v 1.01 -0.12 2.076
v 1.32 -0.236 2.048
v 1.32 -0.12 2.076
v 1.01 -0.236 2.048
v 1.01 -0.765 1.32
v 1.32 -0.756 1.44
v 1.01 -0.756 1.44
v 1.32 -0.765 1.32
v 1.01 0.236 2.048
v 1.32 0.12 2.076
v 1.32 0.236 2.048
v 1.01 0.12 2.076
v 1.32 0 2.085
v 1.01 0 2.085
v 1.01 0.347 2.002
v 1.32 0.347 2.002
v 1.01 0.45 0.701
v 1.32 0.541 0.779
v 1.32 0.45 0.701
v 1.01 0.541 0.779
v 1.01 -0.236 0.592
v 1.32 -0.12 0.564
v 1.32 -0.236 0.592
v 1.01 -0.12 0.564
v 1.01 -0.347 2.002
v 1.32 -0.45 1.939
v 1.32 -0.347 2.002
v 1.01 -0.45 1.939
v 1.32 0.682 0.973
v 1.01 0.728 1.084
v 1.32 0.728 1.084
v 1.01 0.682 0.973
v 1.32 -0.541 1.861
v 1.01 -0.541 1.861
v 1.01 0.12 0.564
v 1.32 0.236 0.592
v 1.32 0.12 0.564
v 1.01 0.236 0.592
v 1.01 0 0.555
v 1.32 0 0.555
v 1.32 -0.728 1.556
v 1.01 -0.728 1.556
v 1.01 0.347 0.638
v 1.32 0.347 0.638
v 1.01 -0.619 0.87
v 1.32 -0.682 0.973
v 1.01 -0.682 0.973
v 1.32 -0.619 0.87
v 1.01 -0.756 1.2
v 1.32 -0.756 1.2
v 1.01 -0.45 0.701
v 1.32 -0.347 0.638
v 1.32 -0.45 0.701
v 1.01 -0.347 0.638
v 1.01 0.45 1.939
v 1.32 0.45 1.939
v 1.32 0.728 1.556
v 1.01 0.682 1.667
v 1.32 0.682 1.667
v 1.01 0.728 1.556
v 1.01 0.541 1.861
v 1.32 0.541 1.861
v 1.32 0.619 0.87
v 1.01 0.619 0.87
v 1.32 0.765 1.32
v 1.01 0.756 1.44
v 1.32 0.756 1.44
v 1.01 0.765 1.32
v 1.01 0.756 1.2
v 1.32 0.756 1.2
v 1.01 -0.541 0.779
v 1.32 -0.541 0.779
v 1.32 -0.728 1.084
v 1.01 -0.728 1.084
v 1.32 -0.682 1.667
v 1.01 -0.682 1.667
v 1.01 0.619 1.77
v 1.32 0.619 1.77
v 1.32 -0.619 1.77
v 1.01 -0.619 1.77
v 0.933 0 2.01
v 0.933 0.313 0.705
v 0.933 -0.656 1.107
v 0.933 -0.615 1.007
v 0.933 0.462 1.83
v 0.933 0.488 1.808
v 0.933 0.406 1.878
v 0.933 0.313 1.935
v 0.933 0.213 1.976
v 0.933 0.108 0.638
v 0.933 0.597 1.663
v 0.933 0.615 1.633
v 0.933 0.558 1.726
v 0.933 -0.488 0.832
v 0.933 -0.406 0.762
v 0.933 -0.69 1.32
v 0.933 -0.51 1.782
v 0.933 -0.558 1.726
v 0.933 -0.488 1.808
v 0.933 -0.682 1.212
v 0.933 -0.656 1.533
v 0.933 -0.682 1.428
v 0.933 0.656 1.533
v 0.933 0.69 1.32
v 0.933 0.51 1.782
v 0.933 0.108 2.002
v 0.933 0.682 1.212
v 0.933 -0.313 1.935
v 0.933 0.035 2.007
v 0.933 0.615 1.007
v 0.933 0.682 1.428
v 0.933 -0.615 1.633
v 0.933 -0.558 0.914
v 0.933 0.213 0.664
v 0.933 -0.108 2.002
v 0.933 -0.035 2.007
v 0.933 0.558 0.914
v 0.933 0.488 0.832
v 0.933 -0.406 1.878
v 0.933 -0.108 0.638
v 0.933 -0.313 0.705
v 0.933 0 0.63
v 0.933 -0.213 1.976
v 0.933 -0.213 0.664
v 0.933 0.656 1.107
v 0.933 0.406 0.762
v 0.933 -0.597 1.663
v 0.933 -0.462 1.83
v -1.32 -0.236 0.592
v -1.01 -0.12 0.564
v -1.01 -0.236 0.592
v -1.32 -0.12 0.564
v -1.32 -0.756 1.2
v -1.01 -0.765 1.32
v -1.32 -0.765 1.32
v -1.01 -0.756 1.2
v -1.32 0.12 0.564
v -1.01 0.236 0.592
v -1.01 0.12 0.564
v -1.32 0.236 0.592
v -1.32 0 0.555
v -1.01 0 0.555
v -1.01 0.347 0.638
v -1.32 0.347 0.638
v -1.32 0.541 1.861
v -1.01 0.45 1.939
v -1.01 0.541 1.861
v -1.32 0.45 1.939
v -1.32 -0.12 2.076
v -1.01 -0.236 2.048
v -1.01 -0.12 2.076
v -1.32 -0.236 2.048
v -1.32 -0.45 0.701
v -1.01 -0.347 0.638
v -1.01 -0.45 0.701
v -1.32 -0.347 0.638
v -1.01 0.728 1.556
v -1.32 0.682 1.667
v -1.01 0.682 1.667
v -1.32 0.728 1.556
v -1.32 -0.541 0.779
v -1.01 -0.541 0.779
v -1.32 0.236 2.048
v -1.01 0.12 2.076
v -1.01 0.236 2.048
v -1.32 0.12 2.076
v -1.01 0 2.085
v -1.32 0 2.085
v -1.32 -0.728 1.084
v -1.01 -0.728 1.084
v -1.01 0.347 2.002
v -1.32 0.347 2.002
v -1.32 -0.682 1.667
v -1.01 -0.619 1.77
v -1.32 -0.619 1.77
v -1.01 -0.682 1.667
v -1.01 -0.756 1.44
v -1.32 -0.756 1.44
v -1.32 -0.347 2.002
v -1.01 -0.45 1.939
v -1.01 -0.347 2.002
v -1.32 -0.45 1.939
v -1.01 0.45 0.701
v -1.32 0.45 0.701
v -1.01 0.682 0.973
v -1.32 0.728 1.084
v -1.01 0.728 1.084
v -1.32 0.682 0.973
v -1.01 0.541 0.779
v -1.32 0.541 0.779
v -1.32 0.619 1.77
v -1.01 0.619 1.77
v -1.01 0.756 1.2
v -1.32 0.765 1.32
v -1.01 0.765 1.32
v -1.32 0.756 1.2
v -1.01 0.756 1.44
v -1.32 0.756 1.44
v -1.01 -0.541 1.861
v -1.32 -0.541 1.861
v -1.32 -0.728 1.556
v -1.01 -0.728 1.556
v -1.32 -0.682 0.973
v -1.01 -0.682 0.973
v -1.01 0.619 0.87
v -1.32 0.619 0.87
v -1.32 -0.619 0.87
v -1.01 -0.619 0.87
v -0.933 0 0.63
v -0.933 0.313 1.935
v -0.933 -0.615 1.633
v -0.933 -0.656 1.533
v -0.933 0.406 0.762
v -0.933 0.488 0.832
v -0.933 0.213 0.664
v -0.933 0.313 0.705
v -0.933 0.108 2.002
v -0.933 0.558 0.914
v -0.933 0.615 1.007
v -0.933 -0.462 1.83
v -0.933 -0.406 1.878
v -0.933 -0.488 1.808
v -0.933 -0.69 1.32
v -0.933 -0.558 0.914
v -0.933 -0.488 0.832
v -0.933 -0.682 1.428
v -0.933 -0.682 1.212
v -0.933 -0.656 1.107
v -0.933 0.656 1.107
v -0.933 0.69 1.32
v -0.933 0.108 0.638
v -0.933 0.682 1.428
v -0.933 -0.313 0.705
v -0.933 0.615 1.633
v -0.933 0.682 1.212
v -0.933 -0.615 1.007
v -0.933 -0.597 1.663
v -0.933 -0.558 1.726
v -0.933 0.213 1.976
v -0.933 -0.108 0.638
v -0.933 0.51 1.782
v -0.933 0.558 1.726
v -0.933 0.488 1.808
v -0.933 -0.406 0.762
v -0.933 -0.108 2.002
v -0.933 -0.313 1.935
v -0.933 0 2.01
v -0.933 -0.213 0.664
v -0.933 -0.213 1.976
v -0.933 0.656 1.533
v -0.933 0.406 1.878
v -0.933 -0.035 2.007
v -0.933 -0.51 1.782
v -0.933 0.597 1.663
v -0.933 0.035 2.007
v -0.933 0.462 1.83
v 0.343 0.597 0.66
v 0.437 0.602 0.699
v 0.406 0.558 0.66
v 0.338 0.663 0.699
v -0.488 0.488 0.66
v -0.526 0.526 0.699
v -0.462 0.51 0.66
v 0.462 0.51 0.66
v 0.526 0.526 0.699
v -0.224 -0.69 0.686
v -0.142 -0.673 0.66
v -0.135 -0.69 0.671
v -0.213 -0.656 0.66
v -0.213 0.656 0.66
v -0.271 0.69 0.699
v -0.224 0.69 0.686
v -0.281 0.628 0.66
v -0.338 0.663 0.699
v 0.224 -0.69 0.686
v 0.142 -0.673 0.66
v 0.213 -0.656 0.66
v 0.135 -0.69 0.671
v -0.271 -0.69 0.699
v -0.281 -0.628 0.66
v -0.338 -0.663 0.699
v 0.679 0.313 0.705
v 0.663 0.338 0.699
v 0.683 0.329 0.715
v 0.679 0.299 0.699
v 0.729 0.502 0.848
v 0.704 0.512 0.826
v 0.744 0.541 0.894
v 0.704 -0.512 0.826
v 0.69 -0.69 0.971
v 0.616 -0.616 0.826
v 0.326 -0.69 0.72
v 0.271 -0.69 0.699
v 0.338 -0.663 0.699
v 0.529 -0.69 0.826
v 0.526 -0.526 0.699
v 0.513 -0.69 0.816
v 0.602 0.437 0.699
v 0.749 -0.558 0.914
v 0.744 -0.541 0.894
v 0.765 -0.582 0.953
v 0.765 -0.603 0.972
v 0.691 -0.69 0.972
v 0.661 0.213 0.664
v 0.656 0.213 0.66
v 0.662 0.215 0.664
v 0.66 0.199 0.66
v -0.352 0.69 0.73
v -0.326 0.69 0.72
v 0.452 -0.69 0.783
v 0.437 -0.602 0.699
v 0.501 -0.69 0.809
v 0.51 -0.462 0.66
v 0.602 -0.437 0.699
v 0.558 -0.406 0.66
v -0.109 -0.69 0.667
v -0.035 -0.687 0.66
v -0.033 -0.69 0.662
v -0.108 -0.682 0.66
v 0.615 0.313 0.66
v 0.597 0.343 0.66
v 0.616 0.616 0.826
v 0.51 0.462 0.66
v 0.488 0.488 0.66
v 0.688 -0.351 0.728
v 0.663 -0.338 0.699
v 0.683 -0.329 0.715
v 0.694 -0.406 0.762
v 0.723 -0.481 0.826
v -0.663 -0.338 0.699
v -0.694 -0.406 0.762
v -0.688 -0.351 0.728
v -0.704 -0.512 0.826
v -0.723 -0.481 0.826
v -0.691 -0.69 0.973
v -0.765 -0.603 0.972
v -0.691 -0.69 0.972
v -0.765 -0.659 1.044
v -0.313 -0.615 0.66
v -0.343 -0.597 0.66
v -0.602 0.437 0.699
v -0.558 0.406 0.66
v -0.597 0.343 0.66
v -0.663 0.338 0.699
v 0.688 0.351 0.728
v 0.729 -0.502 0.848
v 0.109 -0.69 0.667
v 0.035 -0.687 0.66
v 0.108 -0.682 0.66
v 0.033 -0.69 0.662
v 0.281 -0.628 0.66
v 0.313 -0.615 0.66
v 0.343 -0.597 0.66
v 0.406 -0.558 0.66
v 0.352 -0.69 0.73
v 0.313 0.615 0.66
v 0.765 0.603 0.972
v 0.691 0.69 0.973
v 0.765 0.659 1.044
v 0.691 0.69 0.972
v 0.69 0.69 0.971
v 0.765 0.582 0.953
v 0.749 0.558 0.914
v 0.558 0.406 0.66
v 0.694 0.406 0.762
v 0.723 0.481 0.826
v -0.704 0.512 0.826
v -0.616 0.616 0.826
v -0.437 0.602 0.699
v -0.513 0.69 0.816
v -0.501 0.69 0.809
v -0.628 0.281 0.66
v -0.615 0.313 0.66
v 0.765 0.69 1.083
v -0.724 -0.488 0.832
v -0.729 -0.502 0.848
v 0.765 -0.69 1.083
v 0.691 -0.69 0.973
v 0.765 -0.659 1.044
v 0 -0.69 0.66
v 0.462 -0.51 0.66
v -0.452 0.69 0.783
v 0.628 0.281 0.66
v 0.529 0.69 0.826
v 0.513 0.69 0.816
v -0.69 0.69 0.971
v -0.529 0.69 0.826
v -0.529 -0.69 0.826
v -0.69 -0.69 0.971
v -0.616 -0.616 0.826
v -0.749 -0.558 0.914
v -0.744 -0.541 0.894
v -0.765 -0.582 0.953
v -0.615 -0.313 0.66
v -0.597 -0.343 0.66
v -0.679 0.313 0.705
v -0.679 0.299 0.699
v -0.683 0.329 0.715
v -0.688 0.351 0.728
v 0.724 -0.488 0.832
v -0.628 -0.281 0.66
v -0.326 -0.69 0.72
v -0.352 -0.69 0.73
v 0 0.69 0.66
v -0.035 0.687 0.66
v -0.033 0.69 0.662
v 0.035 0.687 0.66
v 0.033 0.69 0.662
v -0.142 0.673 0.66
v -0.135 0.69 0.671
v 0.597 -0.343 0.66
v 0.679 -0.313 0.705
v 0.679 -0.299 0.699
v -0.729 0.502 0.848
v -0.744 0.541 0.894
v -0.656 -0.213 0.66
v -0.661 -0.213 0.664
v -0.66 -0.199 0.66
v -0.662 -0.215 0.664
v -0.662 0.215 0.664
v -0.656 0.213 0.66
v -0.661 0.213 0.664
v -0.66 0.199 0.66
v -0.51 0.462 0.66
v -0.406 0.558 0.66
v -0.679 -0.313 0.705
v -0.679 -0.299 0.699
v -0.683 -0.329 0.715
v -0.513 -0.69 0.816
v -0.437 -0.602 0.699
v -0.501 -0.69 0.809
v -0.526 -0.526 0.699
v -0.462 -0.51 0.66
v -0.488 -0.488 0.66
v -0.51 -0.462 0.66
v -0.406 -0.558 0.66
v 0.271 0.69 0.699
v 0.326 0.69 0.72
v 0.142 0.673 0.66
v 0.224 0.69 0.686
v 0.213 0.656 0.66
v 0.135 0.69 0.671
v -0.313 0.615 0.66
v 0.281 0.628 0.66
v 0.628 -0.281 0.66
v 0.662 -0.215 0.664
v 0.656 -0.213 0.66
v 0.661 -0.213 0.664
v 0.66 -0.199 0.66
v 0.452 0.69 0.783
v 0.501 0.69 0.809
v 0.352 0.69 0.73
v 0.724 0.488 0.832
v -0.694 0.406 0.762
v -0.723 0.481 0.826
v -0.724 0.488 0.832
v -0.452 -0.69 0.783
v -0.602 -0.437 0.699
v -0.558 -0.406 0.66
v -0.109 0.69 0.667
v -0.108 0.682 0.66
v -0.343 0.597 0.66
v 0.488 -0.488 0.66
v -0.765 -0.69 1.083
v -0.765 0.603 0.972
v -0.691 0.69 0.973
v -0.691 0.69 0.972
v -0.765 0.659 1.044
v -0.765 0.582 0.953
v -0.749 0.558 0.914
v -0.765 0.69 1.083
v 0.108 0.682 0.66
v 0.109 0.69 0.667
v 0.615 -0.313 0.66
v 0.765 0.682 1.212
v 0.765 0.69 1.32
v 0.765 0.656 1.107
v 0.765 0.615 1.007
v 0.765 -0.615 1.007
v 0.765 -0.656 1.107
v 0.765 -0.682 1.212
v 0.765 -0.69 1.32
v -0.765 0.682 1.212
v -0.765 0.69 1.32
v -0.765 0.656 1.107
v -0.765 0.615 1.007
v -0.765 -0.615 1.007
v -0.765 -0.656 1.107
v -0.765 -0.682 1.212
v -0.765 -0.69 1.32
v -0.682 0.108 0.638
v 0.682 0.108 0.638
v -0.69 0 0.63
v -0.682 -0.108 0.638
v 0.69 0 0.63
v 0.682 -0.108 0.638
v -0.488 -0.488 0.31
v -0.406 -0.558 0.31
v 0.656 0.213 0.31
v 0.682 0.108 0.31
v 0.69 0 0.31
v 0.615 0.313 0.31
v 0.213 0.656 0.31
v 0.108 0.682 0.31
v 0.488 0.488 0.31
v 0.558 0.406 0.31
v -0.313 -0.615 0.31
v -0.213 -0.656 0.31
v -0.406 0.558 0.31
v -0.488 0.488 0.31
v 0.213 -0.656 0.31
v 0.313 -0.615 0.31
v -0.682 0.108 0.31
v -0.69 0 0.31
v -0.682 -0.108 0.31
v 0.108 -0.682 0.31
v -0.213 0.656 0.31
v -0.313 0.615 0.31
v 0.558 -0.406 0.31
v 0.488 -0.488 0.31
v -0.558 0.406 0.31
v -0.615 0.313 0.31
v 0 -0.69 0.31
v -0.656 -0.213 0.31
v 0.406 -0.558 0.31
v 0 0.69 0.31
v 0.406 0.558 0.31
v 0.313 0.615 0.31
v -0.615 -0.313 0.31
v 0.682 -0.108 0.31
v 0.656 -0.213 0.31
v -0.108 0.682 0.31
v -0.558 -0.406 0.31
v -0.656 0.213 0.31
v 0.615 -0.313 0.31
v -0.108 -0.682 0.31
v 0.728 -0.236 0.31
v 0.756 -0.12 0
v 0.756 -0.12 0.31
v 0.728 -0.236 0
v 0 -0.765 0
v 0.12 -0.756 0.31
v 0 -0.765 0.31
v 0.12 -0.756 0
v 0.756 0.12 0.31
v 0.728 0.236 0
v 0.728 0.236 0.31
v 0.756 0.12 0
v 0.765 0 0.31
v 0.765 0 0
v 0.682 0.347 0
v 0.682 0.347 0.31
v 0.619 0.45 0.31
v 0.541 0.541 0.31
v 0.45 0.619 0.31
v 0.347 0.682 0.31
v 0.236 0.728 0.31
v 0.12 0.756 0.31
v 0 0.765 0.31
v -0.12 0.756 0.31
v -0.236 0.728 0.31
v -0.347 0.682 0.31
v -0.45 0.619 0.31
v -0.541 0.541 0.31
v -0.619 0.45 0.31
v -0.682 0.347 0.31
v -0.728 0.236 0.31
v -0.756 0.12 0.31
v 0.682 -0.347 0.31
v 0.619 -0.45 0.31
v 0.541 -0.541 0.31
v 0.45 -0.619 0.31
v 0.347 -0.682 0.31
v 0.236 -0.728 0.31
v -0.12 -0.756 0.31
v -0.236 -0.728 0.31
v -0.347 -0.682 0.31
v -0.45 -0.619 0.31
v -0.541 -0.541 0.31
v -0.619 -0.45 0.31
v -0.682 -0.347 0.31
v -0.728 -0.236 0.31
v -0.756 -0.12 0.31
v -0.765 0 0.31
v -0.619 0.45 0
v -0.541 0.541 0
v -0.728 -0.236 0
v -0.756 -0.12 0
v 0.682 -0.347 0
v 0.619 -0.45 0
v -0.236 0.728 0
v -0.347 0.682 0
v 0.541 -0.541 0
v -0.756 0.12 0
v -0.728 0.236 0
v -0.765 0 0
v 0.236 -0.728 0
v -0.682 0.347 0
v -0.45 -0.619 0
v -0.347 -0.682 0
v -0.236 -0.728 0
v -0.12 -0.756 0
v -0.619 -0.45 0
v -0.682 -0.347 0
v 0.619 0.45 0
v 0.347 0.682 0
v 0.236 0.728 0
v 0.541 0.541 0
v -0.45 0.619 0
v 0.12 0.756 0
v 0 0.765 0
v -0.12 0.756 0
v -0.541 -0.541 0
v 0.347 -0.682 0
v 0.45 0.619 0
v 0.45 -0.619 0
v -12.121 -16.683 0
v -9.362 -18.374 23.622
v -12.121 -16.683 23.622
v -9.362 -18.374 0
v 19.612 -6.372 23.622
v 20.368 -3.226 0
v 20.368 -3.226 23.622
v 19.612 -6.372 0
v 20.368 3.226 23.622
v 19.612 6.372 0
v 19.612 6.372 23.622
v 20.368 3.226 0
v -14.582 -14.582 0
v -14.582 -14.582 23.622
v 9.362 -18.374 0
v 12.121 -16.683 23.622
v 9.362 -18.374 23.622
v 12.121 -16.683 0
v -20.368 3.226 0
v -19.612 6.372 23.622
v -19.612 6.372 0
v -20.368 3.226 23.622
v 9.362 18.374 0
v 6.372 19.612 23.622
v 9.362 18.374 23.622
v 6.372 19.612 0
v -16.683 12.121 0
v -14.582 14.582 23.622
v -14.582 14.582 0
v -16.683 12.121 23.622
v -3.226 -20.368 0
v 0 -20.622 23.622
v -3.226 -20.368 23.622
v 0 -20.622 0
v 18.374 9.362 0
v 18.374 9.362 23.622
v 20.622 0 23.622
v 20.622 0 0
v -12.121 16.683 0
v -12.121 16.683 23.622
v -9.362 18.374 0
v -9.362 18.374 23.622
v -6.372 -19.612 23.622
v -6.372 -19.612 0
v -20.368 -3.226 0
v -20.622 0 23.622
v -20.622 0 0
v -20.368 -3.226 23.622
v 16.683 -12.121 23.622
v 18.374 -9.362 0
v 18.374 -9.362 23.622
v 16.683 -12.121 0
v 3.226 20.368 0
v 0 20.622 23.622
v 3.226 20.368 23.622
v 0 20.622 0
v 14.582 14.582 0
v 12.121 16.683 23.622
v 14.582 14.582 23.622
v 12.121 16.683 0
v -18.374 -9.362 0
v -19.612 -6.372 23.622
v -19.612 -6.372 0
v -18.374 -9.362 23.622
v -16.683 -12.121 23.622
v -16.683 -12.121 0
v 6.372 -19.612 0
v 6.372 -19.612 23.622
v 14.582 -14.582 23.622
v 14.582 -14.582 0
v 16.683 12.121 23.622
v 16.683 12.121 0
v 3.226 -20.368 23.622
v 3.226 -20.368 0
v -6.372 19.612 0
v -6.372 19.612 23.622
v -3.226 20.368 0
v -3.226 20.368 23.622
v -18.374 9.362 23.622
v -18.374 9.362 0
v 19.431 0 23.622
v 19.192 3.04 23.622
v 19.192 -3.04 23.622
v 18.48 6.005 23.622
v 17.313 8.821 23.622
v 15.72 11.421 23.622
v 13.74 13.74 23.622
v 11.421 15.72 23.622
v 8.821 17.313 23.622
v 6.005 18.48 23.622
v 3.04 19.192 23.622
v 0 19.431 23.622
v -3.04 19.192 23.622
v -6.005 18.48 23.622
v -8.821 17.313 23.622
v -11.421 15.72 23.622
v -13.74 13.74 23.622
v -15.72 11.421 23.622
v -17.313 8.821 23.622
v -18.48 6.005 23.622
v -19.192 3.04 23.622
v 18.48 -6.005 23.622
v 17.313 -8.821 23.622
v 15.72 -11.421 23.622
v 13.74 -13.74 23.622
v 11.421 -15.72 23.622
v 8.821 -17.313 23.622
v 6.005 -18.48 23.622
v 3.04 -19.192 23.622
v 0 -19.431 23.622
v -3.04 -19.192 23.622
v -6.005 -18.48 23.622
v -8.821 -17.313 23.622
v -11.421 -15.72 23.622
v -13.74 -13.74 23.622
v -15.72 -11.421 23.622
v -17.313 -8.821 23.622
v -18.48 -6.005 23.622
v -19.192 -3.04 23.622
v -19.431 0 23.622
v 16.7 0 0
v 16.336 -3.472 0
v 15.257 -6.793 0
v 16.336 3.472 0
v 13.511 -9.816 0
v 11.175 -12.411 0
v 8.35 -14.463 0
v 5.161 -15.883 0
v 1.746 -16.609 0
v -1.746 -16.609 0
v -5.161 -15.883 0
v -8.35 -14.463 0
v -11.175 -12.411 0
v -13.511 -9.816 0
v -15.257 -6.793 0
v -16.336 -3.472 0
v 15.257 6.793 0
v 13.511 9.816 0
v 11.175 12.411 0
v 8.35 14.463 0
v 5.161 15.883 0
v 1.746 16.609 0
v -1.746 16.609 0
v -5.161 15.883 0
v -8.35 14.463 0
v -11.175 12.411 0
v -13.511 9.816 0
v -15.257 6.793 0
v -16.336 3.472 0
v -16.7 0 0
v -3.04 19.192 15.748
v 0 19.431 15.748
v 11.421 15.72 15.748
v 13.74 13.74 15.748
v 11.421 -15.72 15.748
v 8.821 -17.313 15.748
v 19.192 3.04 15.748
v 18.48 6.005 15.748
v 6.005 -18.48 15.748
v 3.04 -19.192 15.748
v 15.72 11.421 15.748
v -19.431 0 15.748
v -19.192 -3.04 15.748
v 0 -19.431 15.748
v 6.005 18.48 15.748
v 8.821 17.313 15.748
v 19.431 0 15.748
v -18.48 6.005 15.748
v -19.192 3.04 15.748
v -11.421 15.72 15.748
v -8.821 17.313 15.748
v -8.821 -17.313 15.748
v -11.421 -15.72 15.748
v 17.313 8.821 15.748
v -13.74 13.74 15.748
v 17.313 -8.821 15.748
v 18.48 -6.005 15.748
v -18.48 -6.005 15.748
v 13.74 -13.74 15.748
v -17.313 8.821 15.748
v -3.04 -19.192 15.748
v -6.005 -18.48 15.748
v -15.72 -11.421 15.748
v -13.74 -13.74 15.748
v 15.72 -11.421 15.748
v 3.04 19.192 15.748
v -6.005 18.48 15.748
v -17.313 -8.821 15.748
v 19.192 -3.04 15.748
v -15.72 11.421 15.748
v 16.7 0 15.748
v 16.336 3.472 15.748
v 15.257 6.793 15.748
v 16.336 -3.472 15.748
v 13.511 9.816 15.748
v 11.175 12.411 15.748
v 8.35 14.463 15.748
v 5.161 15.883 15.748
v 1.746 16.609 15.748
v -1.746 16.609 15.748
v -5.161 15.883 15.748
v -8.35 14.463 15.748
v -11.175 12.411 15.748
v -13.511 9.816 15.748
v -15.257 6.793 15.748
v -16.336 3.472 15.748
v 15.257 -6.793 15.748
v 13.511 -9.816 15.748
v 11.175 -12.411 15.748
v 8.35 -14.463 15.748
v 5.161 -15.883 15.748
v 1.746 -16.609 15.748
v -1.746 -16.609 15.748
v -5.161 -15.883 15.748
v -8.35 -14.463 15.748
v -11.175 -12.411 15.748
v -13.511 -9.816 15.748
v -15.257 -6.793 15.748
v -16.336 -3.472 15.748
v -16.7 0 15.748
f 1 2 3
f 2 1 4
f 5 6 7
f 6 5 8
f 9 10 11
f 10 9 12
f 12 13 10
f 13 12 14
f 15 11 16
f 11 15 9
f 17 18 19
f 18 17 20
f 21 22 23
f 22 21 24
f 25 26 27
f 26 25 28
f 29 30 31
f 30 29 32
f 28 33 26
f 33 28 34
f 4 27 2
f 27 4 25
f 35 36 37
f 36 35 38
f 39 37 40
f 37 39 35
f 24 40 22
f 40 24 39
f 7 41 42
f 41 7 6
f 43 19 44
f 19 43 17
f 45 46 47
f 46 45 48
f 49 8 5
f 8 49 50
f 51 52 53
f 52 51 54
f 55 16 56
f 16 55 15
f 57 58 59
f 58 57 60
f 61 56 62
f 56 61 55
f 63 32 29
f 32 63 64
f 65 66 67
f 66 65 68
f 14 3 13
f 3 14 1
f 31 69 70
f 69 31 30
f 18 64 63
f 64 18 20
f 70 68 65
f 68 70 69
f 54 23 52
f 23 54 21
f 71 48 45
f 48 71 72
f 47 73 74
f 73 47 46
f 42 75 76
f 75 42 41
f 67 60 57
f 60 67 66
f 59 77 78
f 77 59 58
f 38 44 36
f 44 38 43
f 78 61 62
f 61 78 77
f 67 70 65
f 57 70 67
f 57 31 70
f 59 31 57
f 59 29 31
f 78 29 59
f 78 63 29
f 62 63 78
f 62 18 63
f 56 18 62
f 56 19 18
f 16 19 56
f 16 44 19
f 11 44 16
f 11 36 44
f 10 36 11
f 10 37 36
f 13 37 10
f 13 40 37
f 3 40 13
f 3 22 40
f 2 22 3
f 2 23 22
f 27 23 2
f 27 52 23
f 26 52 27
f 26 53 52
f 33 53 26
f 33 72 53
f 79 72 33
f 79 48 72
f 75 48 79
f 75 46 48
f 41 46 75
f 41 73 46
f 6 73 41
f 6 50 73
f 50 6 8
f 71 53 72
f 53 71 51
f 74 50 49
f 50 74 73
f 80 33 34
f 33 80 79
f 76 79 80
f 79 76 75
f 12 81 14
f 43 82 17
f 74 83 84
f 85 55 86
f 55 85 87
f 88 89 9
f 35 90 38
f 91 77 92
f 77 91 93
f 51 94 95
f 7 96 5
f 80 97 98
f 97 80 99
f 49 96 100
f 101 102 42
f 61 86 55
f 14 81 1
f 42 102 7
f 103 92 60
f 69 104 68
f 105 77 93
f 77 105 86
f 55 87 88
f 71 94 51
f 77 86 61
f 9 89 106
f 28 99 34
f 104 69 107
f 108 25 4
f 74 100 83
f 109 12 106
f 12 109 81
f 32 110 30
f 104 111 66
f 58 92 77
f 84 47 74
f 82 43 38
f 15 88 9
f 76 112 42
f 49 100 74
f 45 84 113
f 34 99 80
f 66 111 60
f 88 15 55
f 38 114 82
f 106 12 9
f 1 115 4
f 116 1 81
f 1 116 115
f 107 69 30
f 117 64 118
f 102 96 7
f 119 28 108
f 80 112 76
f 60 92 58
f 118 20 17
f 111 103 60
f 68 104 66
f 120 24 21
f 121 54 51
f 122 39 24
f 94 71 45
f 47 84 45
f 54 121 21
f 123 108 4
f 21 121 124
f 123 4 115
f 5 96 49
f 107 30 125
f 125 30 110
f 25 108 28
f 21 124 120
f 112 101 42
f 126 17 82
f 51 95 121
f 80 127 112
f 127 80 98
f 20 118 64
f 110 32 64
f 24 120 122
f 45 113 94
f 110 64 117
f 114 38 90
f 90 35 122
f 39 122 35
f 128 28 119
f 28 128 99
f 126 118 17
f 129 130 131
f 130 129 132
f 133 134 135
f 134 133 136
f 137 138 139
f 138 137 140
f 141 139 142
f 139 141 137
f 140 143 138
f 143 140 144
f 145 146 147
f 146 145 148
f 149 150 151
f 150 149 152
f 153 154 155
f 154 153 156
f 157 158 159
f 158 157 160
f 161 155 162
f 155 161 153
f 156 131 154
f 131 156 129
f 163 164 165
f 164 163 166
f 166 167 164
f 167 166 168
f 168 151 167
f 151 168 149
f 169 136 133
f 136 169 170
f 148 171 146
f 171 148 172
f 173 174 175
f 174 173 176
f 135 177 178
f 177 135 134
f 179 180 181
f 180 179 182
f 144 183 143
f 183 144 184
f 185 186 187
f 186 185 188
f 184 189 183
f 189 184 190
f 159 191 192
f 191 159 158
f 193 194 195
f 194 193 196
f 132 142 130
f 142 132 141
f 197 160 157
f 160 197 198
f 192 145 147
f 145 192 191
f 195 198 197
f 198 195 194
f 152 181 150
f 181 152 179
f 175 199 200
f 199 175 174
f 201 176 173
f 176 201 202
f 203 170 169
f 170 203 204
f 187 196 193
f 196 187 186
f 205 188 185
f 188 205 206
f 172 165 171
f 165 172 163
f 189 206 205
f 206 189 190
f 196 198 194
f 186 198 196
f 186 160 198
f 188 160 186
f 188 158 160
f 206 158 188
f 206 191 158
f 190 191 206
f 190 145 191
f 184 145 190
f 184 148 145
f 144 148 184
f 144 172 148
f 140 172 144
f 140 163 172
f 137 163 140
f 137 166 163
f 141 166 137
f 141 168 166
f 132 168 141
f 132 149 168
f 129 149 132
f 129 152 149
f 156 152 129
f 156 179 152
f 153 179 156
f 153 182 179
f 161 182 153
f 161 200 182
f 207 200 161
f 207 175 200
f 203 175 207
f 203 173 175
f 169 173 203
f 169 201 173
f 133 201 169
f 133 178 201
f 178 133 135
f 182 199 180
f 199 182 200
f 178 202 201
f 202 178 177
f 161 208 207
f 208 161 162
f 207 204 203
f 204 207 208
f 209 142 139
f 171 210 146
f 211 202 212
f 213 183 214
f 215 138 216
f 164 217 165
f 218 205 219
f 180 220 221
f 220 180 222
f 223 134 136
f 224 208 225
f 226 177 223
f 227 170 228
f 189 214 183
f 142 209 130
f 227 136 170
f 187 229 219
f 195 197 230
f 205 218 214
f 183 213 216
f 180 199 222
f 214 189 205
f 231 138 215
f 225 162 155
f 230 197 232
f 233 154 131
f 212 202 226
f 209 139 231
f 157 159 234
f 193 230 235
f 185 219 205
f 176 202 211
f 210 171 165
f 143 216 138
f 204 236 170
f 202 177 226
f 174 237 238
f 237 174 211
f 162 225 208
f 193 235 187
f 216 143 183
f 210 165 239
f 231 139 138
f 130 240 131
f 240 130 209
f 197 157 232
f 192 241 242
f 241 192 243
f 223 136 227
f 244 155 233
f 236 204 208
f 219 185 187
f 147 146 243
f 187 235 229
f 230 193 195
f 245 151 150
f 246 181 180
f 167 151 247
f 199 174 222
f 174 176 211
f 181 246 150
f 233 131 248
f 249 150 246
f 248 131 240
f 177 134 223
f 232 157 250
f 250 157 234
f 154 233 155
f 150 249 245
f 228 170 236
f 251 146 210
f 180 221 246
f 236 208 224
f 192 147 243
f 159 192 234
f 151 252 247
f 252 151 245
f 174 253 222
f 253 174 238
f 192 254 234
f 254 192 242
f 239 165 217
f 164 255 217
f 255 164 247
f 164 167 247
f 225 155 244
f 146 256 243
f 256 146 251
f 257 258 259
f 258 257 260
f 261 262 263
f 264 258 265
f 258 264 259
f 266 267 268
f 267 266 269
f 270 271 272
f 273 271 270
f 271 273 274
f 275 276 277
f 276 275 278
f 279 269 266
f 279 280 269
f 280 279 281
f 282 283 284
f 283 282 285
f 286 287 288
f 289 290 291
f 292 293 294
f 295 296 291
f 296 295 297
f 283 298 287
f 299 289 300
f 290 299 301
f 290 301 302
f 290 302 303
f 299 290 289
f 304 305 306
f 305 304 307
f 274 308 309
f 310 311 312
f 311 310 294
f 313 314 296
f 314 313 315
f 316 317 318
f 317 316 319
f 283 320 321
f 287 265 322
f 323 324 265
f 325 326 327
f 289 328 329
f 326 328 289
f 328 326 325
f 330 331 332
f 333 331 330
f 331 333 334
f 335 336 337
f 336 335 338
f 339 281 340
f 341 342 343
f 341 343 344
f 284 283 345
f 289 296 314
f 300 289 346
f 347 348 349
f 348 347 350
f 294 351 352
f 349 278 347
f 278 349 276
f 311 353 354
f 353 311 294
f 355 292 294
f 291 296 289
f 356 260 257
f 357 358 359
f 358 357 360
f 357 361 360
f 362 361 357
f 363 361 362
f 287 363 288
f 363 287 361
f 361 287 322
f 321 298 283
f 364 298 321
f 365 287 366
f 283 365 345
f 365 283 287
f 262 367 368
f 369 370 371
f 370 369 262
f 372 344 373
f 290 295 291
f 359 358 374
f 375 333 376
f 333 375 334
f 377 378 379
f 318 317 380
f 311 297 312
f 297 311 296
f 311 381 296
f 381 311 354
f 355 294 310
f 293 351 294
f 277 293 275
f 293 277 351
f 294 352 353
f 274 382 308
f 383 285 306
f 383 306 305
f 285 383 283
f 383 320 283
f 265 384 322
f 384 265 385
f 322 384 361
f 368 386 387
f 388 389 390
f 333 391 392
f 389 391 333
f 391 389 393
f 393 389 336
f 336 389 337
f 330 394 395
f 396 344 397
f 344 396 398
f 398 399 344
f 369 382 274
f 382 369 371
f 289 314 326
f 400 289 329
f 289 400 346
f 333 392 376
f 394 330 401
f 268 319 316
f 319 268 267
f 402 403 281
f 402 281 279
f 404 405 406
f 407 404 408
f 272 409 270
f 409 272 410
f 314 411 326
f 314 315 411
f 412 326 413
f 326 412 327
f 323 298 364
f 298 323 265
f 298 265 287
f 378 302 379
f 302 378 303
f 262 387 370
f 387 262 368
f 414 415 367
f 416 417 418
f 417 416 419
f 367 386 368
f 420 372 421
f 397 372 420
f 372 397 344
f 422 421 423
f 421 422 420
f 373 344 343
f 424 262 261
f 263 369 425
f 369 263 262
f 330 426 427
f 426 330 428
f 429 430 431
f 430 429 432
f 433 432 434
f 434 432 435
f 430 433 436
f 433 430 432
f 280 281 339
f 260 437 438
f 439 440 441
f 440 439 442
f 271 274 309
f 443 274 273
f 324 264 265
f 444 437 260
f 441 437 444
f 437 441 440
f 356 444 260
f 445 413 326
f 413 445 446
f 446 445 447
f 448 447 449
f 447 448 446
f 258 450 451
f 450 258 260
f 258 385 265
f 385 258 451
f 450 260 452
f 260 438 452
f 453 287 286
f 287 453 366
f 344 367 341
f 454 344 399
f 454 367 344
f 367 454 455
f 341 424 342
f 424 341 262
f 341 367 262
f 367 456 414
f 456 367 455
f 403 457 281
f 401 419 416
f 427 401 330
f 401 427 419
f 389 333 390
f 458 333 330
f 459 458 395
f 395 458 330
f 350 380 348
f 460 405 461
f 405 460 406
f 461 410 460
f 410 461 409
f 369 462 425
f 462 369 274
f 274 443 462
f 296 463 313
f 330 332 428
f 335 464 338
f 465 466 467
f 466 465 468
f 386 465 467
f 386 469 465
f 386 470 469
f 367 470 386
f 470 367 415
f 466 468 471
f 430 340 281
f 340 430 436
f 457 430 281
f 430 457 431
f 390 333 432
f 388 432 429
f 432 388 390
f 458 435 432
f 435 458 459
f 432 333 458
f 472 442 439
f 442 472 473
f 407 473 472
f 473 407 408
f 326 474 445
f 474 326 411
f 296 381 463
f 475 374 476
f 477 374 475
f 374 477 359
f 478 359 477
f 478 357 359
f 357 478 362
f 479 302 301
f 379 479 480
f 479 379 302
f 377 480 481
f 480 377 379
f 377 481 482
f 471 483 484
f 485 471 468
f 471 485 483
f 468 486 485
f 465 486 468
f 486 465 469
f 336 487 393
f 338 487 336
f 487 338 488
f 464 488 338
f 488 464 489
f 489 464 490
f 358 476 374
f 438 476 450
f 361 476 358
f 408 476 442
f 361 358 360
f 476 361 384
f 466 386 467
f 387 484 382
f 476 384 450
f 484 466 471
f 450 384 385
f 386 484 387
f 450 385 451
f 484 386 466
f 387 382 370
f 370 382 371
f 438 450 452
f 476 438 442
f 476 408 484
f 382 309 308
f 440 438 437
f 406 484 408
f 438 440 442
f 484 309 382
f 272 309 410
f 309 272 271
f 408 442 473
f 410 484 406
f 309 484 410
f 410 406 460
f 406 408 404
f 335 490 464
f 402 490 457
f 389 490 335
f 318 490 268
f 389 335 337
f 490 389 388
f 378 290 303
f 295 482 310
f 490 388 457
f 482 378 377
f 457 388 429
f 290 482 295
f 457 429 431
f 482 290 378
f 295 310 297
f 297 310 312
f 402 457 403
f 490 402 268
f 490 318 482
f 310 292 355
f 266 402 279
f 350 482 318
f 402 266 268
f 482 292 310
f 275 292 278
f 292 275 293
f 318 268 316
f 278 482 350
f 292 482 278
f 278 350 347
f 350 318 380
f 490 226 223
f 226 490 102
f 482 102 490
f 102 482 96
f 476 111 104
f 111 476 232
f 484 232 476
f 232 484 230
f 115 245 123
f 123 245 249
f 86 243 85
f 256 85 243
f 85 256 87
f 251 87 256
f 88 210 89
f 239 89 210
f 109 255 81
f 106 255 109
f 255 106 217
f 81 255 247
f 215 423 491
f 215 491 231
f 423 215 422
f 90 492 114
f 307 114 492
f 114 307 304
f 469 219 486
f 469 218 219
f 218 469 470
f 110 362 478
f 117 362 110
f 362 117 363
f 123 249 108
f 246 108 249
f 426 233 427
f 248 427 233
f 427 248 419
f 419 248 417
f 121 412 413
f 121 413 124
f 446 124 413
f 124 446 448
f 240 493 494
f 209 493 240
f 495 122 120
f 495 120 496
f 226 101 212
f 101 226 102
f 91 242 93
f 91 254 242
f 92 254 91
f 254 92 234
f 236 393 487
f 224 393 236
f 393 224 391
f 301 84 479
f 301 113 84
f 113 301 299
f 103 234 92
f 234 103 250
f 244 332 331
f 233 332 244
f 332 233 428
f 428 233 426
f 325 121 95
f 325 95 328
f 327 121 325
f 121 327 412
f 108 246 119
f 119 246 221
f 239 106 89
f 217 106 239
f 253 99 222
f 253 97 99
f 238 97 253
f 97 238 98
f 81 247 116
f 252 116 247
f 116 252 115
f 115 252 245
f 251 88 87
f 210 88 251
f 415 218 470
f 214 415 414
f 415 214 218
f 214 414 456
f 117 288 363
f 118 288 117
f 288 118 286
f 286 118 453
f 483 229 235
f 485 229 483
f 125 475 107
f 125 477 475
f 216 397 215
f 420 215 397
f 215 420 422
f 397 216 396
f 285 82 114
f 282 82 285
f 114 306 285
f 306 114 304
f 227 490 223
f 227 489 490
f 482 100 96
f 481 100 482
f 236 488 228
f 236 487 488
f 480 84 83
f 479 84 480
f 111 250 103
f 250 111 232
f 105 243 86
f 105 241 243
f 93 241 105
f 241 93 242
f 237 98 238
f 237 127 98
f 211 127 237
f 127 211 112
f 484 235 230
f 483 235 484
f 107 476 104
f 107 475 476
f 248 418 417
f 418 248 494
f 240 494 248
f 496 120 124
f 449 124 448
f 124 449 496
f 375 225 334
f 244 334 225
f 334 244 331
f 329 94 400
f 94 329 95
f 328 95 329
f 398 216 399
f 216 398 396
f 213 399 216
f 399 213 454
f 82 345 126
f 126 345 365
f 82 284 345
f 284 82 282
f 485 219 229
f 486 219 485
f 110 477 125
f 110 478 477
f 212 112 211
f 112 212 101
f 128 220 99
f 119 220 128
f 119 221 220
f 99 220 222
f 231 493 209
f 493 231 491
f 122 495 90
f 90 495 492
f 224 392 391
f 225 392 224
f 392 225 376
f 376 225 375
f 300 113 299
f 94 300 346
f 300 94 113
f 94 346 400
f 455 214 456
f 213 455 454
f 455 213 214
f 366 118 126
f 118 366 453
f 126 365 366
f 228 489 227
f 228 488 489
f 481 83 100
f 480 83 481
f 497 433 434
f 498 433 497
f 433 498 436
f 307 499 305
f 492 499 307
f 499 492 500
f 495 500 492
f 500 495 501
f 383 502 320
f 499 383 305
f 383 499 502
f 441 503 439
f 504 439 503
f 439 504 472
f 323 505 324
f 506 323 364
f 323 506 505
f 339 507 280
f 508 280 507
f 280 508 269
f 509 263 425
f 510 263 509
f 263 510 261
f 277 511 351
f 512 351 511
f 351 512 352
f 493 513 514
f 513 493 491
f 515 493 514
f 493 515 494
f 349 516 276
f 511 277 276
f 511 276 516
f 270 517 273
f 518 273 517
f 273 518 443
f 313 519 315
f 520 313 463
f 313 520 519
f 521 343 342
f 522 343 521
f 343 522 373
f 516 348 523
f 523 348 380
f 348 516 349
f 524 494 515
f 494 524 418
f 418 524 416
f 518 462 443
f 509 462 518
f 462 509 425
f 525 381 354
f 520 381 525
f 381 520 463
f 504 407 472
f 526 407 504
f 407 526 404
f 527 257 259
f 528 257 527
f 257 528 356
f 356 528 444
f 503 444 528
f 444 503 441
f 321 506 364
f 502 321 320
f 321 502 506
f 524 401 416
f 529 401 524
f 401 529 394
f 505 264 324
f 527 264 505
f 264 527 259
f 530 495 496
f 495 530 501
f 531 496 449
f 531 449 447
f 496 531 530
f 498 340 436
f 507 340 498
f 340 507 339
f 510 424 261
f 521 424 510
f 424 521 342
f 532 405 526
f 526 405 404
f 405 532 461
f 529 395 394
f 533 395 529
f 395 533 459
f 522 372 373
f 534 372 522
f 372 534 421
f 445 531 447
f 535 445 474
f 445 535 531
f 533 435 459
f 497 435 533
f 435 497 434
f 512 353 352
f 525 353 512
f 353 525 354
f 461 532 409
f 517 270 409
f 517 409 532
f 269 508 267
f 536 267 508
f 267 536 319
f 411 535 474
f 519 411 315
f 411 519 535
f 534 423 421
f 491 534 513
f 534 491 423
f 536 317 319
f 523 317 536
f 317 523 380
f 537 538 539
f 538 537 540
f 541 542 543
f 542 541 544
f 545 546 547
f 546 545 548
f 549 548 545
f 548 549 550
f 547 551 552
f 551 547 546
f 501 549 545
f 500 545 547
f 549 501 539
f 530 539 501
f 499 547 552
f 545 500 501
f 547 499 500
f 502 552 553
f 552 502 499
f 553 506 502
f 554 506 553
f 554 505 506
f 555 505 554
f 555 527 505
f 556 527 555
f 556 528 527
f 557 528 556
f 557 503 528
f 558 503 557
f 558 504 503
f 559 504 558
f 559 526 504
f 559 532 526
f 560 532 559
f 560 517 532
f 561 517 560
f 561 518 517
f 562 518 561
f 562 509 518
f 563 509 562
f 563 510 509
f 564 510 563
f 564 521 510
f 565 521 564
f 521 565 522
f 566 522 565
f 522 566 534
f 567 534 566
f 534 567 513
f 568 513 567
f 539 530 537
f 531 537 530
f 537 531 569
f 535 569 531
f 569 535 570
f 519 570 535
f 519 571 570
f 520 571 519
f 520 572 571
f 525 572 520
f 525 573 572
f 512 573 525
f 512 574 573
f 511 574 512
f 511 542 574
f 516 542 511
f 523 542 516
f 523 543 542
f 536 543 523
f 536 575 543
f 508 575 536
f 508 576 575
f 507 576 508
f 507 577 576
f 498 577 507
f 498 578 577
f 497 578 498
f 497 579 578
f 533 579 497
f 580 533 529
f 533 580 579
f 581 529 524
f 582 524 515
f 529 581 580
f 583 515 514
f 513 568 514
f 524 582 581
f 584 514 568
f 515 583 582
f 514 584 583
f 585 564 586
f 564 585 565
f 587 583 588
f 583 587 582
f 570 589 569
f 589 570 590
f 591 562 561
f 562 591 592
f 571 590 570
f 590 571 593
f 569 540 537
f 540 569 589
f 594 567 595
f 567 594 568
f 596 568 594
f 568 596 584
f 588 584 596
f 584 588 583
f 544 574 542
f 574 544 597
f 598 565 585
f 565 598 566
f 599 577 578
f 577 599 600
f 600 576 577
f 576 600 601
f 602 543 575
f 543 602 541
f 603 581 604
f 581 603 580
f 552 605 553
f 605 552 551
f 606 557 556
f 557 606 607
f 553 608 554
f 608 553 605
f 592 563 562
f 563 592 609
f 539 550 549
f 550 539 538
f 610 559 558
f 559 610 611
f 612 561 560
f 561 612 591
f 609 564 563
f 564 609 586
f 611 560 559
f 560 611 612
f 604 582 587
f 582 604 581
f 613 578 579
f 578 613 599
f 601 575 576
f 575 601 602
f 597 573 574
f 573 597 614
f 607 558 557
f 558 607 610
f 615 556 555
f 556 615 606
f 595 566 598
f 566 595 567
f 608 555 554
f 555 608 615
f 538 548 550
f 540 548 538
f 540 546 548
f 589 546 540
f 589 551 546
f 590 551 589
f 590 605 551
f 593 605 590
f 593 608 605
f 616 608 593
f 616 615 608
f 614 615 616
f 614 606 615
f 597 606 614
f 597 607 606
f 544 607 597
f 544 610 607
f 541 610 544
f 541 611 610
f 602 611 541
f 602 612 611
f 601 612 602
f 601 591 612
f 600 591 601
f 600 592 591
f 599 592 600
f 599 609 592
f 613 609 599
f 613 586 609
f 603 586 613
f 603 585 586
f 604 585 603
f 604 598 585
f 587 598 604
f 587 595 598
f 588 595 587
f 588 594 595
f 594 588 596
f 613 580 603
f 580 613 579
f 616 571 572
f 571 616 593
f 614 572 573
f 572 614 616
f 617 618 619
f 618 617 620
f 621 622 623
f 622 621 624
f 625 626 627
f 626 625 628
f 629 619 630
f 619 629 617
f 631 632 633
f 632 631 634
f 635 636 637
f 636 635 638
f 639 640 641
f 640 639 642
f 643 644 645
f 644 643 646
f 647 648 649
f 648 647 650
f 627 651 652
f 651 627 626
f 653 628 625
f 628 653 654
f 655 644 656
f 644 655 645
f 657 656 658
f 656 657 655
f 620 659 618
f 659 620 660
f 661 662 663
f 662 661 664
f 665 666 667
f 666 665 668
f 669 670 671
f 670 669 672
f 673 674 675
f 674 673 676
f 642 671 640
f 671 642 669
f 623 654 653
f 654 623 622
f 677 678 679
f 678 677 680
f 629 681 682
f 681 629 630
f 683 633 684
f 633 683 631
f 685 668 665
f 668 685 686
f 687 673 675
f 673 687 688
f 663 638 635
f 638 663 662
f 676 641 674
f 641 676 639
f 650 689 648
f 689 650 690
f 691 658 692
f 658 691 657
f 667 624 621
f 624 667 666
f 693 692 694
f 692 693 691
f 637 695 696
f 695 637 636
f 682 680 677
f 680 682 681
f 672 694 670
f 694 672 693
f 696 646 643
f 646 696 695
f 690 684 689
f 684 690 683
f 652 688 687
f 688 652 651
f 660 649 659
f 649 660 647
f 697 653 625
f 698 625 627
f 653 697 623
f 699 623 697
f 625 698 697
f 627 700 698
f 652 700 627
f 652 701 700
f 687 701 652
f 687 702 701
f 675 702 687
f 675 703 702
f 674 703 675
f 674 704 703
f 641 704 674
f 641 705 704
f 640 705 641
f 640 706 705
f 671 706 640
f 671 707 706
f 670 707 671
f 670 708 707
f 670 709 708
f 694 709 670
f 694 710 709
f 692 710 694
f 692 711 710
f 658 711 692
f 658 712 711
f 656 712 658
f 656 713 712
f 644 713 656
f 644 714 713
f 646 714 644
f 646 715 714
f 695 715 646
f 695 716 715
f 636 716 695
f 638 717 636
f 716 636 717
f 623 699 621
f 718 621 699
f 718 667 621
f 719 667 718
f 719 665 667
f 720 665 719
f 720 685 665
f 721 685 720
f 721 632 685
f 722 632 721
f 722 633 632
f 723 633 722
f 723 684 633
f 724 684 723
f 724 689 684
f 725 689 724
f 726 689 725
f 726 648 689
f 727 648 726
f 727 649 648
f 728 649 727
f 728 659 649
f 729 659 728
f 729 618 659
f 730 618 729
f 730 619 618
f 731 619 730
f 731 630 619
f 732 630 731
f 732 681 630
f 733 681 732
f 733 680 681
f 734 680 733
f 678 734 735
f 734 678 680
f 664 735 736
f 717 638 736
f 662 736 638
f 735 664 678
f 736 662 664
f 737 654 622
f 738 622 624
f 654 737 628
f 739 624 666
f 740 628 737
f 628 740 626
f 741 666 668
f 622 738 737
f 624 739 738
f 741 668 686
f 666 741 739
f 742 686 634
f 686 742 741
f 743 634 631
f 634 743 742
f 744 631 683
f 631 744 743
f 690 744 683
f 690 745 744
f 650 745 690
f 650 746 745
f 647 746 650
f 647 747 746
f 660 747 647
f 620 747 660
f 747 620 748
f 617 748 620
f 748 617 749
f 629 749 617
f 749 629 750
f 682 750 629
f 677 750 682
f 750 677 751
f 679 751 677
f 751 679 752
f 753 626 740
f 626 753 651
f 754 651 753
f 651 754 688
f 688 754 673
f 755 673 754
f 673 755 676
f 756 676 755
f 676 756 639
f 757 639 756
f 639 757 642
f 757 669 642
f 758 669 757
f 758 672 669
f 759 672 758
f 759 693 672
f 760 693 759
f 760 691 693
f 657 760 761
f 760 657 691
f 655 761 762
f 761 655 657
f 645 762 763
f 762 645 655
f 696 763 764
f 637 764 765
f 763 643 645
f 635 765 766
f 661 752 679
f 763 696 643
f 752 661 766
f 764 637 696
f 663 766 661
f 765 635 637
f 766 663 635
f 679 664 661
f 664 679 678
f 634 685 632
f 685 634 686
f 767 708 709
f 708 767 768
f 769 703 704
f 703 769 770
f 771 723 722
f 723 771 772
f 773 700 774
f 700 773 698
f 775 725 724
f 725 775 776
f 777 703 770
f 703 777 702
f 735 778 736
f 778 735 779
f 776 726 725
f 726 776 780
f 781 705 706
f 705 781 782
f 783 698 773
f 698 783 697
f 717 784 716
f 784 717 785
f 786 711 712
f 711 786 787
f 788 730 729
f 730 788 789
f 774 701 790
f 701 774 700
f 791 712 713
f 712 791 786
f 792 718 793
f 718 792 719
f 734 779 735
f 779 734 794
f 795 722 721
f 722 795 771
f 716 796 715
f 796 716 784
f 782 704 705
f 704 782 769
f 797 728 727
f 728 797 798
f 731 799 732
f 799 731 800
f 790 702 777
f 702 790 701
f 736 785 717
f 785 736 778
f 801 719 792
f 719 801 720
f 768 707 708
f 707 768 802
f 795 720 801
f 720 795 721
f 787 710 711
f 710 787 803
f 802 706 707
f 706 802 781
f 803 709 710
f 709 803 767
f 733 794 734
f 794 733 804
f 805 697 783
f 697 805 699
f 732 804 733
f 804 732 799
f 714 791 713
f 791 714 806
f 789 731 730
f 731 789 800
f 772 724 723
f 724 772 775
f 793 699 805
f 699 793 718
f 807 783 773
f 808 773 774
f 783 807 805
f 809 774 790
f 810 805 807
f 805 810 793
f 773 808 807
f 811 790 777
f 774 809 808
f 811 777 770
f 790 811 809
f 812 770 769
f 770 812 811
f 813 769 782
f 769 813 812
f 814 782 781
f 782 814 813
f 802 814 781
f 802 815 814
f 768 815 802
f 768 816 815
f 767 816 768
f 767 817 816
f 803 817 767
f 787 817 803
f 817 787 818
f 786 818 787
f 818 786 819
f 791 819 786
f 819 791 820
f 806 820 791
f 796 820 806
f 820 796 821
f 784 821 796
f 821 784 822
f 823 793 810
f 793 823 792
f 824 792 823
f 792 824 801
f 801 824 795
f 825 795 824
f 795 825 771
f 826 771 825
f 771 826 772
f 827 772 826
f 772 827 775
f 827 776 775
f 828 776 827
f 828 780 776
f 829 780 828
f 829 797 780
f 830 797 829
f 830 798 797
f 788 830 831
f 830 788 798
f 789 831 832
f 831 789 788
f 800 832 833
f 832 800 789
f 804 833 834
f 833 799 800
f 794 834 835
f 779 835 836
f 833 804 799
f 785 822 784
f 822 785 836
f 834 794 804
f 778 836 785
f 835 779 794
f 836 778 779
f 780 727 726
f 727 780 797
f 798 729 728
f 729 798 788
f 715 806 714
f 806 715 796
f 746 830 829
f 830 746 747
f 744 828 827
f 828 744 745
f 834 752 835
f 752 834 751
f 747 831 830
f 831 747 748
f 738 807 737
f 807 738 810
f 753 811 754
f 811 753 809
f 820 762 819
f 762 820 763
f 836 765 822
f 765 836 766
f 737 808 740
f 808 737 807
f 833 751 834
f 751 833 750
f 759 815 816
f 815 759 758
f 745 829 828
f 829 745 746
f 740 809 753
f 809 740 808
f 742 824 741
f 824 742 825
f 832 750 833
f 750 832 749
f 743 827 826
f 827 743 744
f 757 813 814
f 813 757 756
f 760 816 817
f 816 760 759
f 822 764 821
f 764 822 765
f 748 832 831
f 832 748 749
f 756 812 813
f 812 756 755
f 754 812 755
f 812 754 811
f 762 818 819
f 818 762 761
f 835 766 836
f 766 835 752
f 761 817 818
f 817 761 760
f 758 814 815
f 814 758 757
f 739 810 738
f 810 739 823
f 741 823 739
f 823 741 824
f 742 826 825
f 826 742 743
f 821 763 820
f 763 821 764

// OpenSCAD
// file: ../Vitamins/Rod.scad
RodDiameter       = 1;
RodRadius         = 2;
RodClearanceSnug  = 3;
RodClearanceLoose = 4;
RodFn             = 5;

RodOneEighthInch = [
  [RodDiameter, 1/8],
  [RodRadius, 1/8/2],
  [RodClearanceSnug, 0.02],
  [RodClearanceLoose, 0.03],
  [RodFn, 16]
];

RodOneQuarterInch = [
  [RodDiameter,       1/4],
  [RodRadius,         1/4/2],
  [RodClearanceSnug,  0.027],
  [RodClearanceLoose, 0.035],
  [RodFn,             20]
];

RodThreeQuarterInchTubing = [
  [RodDiameter,       0.758],
  [RodRadius,         0.758/2],
  [RodClearanceSnug,  0.023],
  [RodClearanceLoose, 0.029],
  [RodFn,             40]
];

/**
 * Lookup the diameter of a rod.
 * @param rod The rod to lookup.
 * @param clearance The RodClearance to use.
 */
function RodDiameter(rod=undef, clearance=undef)
           = lookup(RodDiameter, rod)
          + (clearance != undef ? lookup(clearance, rod) : 0);

/**
 * Lookup the radius of a rod.
 * @param rod The rod to lookup.
 * @param clearance The RodClearance to use.
 */
function RodRadius(rod, clearance=undef) = RodDiameter(rod, clearance)/2;

/**
 * Lookup the $fn value for a rod, optionally overriding it
 * @param rod The rod to lookup.
 * @param $fn Override the RodFn. If defined, this will be the result. (convenience arg)
 **/
function RodFn(rod, $fn=undef) = ($fn == undef) ? lookup(RodFn, rod) : $fn;

/**
 * A 2D rod (circle).
 * @param rod The rod to render.
 * @param clearance The RodClearance to use.
 * @param $fn Override the RodFn value of the rod.
 */
module Rod2d(rod=RodOneQuarterInch, clearance=undef, $fn=undef) {
  circle(r=RodRadius(rod, clearance),
         $fn=RodFn(rod, $fn));
}


module Rod(rod=RodOneQuarterInch, length=1, clearance=undef, center=false, $fn=undef) {
  render(convexity=1)
  linear_extrude(height=length, center=center)
  Rod2d(rod, clearance, $fn=$fn);
}

// 1/8" Rod
1_8_rod_d                = 1/8;
1_8_rod_r                = 1_8_rod_d/2;
1_8_rod_clearance        = 0.02;
1_8_rod_clearance_loose  = 0.03;

// 1/4" Rod
1_4_rod_d                = 1/4;
1_4_rod_r                = 1_4_rod_d/2;
1_4_rod_clearance        = 0.01;
1_4_rod_clearance_loose  = 0.015;
1_4_rod_collar_d         = 1/22;
1_4_rod_collar_width     = 0.27;
1_4_rod_collar_clearance = 0.0; // TODO

// 5/16" Rod
5_16_rod_d                = 5/16;
5_16_rod_r                = 5_16_rod_d/2;
5_16_rod_clearance        = 0.02; // TODO
5_16_rod_clearance_loose  = 0.02;

module rod(diameter=1, length=1, clearance=0, clearance_loose=0, loose=false, cutter=false, center=false, $fn=20) {
  clearance = loose ? clearance_loose : clearance;

  if (cutter) {
    cylinder(r=(diameter/2) + (loose ? clearance_loose : clearance), h=length, center=center);
  } else {
    cylinder(r=diameter/2, h=length, center=center);
  }
}

module 1_8_rod(length=1, loose=false, cutter=false, center=false) {
  rod(diameter=1_8_rod_d,
      clearance=1_8_rod_clearance,
      clearance_loose=1_8_rod_clearance_loose,
      length=length,
      cutter=cutter,
      center=center);
}

module 1_4_rod(length=1, loose=false, cutter=false, center=false) {
  rod(diameter=1_4_rod_d,
      clearance=1_4_rod_clearance,
      clearance_loose=1_4_rod_clearance_loose,
      loose=loose,
      length=length,
      cutter=cutter,
      center=center);
}

module 1_4_rod_collar(cutter=false) {
  rod(diameter=1_4_rod_collar_d,
      clearance=1_4_rod_collar_clearance,
      cutter=cutter,
      length=1_4_rod_collar_width);
}

module 5_16_rod(length=1, loose=false, cutter=false, center=false) {
  rod(diameter=5_16_rod_d,
      clearance=5_16_rod_clearance,
      clearance_loose=5_16_rod_clearance_loose,
      length=length,
      cutter=cutter,
      center=center);
}
// file: ../Vitamins/Pipe.scad
//
// Pipe dimensions
//
PipeInnerDiameter   = 1; // Inner Diameter of pipe, smallest measurement if asymmetrical
PipeOuterDiameter   = 2; // Outer Diameter of pipe, largest measurement if asymmetrical
PipeTaperedDiameter = 3; // Threads are tapered, smallest measurement if asymmetrical
PipeThreadLength    = 4; // Total length of the pipe thread
PipeThreadDepth     = 5; // Depth when fully seated
PipeClearanceSnug   = 6; // Added to the diameter, should not slip
PipeClearanceLoose  = 7; // Added to the diameter, should slide freely
PipeFn              = 8; // Number of sides
PipeWeightPerUnit   = 9;

function PipeClearance(pipe, clearance)     = (clearance != undef) ? lookup(clearance, pipe) : 0;
function PipeOuterDiameter(pipe, clearance) = lookup(PipeOuterDiameter, pipe) + PipeClearance(clearance);
function PipeInnerDiameter(pipe, clearance) = lookup(PipeInnerDiameter, pipe) + PipeClearance(clearance);
function PipeOuterRadius(pipe, clearance)   = PipeOuterDiameter(pipe, clearance)/2;
function PipeInnerRadius(pipe, clearance)   = PipeInnerDiameter(pipe, clearance)/2;
function PipeWall(pipe)                     = PipeOuterRadius(pipe) - PipeInnerRadius(pipe);

module Pipe(pipe, length = 1, clearance=undef) {
  cylinder(r=PipeOuterRadius(pipe, clearance=clearance), h=length, $fn=lookup(PipeFn, pipe));
};

//Pipe(PipeOneInch, clearance=PipeClearanceLoose);


// 1/4" Pipe
PipeOneQuarterInch = [
  [PipeInnerDiameter,   0.265],
  [PipeOuterDiameter,   0.415],
  [PipeTaperedDiameter, 0.415], // TODO: Verify
  [PipeThreadLength,    0.5],   // TODO: Verify
  [PipeThreadDepth,     0.25],  // TODO: Verify
  [PipeClearanceSnug,   0.015], // TODO: Verify
  [PipeClearanceLoose,  0.027], // TODO: Verify
  [PipeFn,              20],
  [PipeWeightPerUnit,   0] // TODO
];


// 3/4" Pipe
PipeThreeQuartersInch = [
  [PipeInnerDiameter,   0.81],
  [PipeOuterDiameter,   1.07],
  [PipeTaperedDiameter, 1.018],
  [PipeThreadLength,    0.9],
  [PipeThreadDepth,     0.5],
  [PipeClearanceSnug,   0.005],
  [PipeClearanceLoose,  0.027],
  [PipeFn,              30],
  [PipeWeightPerUnit,   0] // TODO
];

// 1" Pipe
PipeOneInch = [
  [PipeInnerDiameter,   1.06],
  [PipeOuterDiameter,   1.315],
  [PipeTaperedDiameter, 1.285],
  [PipeThreadLength,    0.982],
  [PipeThreadDepth,     0.5], // TODO: Verify
  [PipeClearanceSnug,   0.02],
  [PipeClearanceLoose,  0.03],
  [PipeFn,              30],
  [PipeWeightPerUnit,   0] // TODO
];


// Fittings: Tee
TeeOuterDiameter = 1; // Diameter of the body, not the rim
TeeWidth         = 2; // Across the top of the tee, side-to-side
TeeHeight        = 3; // From the middle of the bottom rim to the top of the body
TeeInnerDiameter = 4; // Diameter of the threaded hole
TeeRimDiameter   = 5; // Diameter of the tee rim
TeeRimWidth      = 6; // Width of the tee rim
TeeInfillSphere  = 7; // Diameter of the infill sphere, cuts out the casting infill between the tee sections
TeeInfillOffset  = 8; // Offset for the infill sphere from center

TeeThreeQuarterInch = [
  [TeeOuterDiameter, 1.38],
  [TeeWidth,         2.64],
  [TeeHeight,        2.01],
  [TeeInnerDiameter, 0.88],
  [TeeRimDiameter,   1.53],
  [TeeRimWidth,      0.31],
  [TeeInfillSphere,  0.25],
  [TeeInfillOffset,  0.38]
];

function TeeOuterDiameter(tee) = lookup(TeeOuterDiameter, tee);
function TeeOuterRadius(tee)   = lookup(TeeOuterDiameter, tee)/2;
function TeeWidth(tee)         = lookup(TeeWidth, tee);
function TeeHeight(tee)        = lookup(TeeHeight, tee);
function TeeInnerDiameter(tee) = lookup(TeeInnerDiameter, tee);
function TeeInnerRadius(tee)   = lookup(TeeInnerDiameter, tee)/2;
function TeeRimDiameter(tee)   = lookup(TeeRimDiameter, tee);
function TeeRimRadius(tee)     = lookup(TeeRimDiameter, tee)/2;
function TeeRimWidth(tee)      = lookup(TeeRimWidth, tee);
function TeeCenter(tee)        = lookup(TeeHeight, tee) - TeeOuterRadius(tee);

module Tee(tee, $fn=40) {
   union() {

     // Top Body
     rotate([0,-90,0])
     translate([TeeHeight(tee) - (TeeOuterDiameter(tee)/2),0,0])
     cylinder(r=TeeOuterRadius(tee), h=TeeWidth(tee) * 0.99, center=true);

     // Bottom Body
     translate([0,0,TeeCenter(tee) * 0.01])
     cylinder(r=TeeOuterRadius(tee), h=TeeCenter(tee) * 0.98);

     // Bottom Rim
     cylinder(r=TeeRimRadius(tee), h=TeeRimWidth(tee));
     
    
    // Rims
    for (i = [1, -1]) {
      
      // Rim
      translate([i*TeeWidth(tee)/2,0,TeeCenter(tee)])
      rotate([0,i*-90,0]) {
      cylinder(r=TeeRimRadius(tee), h=TeeRimWidth(tee));
      
      // Casting Infill
      translate([0,0,TeeRimWidth(tee)])
      cylinder(r1=TeeRimRadius(tee),
               r2=TeeOuterRadius(tee),
                h=TeeRimWidth(tee)*1/4);
      }
    }
    
    // Tee Body Casting Infill
    // TODO: Tweak this? Could be better, could be worse.
    intersection() {
      translate([0,0,TeeCenter(tee) + lookup(TeeInfillSphere, tee)])
      sphere(r=TeeRimRadius(tee) + lookup(TeeInfillOffset, tee));

      translate([-TeeRimRadius(tee),-TeeOuterRadius(tee),0])
      cube([TeeRimDiameter(tee),TeeOuterDiameter(tee),TeeCenter(tee)]);
    }
   }
};

Tee(TeeThreeQuarterInch);

module TeeRim(tee=TeeThreeQuarterInch, heightMultiplier=1) {
  cylinder(r=TeeRimRadius(tee), h=TeeRimWidth(tee) * heightMultiplier);
}

// Fittings: Bushings
BushingHeight    = 1;
BushingDiameter  = 2;
BushingDepth     = 3; // Bushing screws in about half an inch
BushingCapWidth  = 4;
BushingCapHeight = 5;


// 3/4" Bushing
BushingThreeQuarterInch = [
  [BushingHeight,    0.955],
  [BushingDiameter,  1],
  [BushingDepth,     0.5],
  [BushingCapWidth,  1.225],
  [BushingCapHeight, 0.215]
];

function BushingHeight(bushing) = lookup(BushingHeight, bushing);
function BushingDepth(bushing) = lookup(BushingDepth, bushing);

module Bushing(spec=BushingThreeQuarterInch) {

  od        = lookup(BushingDiameter, spec);
  height    = lookup(BushingHeight, spec);
  capWidth  = lookup(BushingCapWidth, spec);
  capHeight = lookup(BushingCapHeight, spec);

  union() {

    // Body
    translate([0,0,capHeight/2])
    cylinder(r=od/2, h=height - (capHeight/2), $fn=20);

    // Head
    cylinder(r=capWidth/2, h=capHeight, $fn=6);
  }
}
// main file
include <../Vitamins/Pipe.scad>;
include <../Vitamins/Rod.scad>;

module trunnion_jig(wall=3/64, trunnion=PipeOneInch, tee=TeeThreeQuarterInch, $fn=40) {
  difference() {
    cylinder(r=TeeRimDiameter(tee)/2 + wall, h=TeeRimWidth(tee)*3);

    // Tee Rim
    translate([0,0,TeeRimWidth(tee)*2])
    TeeRim(tee=tee, heightMultiplier=2.1);

    // Gas Sealing Pipe
    translate([0,0,-0.1])
    Pipe(pipe=trunnion, clearance=PipeClearanceSnug);
  
  }
}

scale([25.4, 25.4, 25.4])
trunnion_jig();
